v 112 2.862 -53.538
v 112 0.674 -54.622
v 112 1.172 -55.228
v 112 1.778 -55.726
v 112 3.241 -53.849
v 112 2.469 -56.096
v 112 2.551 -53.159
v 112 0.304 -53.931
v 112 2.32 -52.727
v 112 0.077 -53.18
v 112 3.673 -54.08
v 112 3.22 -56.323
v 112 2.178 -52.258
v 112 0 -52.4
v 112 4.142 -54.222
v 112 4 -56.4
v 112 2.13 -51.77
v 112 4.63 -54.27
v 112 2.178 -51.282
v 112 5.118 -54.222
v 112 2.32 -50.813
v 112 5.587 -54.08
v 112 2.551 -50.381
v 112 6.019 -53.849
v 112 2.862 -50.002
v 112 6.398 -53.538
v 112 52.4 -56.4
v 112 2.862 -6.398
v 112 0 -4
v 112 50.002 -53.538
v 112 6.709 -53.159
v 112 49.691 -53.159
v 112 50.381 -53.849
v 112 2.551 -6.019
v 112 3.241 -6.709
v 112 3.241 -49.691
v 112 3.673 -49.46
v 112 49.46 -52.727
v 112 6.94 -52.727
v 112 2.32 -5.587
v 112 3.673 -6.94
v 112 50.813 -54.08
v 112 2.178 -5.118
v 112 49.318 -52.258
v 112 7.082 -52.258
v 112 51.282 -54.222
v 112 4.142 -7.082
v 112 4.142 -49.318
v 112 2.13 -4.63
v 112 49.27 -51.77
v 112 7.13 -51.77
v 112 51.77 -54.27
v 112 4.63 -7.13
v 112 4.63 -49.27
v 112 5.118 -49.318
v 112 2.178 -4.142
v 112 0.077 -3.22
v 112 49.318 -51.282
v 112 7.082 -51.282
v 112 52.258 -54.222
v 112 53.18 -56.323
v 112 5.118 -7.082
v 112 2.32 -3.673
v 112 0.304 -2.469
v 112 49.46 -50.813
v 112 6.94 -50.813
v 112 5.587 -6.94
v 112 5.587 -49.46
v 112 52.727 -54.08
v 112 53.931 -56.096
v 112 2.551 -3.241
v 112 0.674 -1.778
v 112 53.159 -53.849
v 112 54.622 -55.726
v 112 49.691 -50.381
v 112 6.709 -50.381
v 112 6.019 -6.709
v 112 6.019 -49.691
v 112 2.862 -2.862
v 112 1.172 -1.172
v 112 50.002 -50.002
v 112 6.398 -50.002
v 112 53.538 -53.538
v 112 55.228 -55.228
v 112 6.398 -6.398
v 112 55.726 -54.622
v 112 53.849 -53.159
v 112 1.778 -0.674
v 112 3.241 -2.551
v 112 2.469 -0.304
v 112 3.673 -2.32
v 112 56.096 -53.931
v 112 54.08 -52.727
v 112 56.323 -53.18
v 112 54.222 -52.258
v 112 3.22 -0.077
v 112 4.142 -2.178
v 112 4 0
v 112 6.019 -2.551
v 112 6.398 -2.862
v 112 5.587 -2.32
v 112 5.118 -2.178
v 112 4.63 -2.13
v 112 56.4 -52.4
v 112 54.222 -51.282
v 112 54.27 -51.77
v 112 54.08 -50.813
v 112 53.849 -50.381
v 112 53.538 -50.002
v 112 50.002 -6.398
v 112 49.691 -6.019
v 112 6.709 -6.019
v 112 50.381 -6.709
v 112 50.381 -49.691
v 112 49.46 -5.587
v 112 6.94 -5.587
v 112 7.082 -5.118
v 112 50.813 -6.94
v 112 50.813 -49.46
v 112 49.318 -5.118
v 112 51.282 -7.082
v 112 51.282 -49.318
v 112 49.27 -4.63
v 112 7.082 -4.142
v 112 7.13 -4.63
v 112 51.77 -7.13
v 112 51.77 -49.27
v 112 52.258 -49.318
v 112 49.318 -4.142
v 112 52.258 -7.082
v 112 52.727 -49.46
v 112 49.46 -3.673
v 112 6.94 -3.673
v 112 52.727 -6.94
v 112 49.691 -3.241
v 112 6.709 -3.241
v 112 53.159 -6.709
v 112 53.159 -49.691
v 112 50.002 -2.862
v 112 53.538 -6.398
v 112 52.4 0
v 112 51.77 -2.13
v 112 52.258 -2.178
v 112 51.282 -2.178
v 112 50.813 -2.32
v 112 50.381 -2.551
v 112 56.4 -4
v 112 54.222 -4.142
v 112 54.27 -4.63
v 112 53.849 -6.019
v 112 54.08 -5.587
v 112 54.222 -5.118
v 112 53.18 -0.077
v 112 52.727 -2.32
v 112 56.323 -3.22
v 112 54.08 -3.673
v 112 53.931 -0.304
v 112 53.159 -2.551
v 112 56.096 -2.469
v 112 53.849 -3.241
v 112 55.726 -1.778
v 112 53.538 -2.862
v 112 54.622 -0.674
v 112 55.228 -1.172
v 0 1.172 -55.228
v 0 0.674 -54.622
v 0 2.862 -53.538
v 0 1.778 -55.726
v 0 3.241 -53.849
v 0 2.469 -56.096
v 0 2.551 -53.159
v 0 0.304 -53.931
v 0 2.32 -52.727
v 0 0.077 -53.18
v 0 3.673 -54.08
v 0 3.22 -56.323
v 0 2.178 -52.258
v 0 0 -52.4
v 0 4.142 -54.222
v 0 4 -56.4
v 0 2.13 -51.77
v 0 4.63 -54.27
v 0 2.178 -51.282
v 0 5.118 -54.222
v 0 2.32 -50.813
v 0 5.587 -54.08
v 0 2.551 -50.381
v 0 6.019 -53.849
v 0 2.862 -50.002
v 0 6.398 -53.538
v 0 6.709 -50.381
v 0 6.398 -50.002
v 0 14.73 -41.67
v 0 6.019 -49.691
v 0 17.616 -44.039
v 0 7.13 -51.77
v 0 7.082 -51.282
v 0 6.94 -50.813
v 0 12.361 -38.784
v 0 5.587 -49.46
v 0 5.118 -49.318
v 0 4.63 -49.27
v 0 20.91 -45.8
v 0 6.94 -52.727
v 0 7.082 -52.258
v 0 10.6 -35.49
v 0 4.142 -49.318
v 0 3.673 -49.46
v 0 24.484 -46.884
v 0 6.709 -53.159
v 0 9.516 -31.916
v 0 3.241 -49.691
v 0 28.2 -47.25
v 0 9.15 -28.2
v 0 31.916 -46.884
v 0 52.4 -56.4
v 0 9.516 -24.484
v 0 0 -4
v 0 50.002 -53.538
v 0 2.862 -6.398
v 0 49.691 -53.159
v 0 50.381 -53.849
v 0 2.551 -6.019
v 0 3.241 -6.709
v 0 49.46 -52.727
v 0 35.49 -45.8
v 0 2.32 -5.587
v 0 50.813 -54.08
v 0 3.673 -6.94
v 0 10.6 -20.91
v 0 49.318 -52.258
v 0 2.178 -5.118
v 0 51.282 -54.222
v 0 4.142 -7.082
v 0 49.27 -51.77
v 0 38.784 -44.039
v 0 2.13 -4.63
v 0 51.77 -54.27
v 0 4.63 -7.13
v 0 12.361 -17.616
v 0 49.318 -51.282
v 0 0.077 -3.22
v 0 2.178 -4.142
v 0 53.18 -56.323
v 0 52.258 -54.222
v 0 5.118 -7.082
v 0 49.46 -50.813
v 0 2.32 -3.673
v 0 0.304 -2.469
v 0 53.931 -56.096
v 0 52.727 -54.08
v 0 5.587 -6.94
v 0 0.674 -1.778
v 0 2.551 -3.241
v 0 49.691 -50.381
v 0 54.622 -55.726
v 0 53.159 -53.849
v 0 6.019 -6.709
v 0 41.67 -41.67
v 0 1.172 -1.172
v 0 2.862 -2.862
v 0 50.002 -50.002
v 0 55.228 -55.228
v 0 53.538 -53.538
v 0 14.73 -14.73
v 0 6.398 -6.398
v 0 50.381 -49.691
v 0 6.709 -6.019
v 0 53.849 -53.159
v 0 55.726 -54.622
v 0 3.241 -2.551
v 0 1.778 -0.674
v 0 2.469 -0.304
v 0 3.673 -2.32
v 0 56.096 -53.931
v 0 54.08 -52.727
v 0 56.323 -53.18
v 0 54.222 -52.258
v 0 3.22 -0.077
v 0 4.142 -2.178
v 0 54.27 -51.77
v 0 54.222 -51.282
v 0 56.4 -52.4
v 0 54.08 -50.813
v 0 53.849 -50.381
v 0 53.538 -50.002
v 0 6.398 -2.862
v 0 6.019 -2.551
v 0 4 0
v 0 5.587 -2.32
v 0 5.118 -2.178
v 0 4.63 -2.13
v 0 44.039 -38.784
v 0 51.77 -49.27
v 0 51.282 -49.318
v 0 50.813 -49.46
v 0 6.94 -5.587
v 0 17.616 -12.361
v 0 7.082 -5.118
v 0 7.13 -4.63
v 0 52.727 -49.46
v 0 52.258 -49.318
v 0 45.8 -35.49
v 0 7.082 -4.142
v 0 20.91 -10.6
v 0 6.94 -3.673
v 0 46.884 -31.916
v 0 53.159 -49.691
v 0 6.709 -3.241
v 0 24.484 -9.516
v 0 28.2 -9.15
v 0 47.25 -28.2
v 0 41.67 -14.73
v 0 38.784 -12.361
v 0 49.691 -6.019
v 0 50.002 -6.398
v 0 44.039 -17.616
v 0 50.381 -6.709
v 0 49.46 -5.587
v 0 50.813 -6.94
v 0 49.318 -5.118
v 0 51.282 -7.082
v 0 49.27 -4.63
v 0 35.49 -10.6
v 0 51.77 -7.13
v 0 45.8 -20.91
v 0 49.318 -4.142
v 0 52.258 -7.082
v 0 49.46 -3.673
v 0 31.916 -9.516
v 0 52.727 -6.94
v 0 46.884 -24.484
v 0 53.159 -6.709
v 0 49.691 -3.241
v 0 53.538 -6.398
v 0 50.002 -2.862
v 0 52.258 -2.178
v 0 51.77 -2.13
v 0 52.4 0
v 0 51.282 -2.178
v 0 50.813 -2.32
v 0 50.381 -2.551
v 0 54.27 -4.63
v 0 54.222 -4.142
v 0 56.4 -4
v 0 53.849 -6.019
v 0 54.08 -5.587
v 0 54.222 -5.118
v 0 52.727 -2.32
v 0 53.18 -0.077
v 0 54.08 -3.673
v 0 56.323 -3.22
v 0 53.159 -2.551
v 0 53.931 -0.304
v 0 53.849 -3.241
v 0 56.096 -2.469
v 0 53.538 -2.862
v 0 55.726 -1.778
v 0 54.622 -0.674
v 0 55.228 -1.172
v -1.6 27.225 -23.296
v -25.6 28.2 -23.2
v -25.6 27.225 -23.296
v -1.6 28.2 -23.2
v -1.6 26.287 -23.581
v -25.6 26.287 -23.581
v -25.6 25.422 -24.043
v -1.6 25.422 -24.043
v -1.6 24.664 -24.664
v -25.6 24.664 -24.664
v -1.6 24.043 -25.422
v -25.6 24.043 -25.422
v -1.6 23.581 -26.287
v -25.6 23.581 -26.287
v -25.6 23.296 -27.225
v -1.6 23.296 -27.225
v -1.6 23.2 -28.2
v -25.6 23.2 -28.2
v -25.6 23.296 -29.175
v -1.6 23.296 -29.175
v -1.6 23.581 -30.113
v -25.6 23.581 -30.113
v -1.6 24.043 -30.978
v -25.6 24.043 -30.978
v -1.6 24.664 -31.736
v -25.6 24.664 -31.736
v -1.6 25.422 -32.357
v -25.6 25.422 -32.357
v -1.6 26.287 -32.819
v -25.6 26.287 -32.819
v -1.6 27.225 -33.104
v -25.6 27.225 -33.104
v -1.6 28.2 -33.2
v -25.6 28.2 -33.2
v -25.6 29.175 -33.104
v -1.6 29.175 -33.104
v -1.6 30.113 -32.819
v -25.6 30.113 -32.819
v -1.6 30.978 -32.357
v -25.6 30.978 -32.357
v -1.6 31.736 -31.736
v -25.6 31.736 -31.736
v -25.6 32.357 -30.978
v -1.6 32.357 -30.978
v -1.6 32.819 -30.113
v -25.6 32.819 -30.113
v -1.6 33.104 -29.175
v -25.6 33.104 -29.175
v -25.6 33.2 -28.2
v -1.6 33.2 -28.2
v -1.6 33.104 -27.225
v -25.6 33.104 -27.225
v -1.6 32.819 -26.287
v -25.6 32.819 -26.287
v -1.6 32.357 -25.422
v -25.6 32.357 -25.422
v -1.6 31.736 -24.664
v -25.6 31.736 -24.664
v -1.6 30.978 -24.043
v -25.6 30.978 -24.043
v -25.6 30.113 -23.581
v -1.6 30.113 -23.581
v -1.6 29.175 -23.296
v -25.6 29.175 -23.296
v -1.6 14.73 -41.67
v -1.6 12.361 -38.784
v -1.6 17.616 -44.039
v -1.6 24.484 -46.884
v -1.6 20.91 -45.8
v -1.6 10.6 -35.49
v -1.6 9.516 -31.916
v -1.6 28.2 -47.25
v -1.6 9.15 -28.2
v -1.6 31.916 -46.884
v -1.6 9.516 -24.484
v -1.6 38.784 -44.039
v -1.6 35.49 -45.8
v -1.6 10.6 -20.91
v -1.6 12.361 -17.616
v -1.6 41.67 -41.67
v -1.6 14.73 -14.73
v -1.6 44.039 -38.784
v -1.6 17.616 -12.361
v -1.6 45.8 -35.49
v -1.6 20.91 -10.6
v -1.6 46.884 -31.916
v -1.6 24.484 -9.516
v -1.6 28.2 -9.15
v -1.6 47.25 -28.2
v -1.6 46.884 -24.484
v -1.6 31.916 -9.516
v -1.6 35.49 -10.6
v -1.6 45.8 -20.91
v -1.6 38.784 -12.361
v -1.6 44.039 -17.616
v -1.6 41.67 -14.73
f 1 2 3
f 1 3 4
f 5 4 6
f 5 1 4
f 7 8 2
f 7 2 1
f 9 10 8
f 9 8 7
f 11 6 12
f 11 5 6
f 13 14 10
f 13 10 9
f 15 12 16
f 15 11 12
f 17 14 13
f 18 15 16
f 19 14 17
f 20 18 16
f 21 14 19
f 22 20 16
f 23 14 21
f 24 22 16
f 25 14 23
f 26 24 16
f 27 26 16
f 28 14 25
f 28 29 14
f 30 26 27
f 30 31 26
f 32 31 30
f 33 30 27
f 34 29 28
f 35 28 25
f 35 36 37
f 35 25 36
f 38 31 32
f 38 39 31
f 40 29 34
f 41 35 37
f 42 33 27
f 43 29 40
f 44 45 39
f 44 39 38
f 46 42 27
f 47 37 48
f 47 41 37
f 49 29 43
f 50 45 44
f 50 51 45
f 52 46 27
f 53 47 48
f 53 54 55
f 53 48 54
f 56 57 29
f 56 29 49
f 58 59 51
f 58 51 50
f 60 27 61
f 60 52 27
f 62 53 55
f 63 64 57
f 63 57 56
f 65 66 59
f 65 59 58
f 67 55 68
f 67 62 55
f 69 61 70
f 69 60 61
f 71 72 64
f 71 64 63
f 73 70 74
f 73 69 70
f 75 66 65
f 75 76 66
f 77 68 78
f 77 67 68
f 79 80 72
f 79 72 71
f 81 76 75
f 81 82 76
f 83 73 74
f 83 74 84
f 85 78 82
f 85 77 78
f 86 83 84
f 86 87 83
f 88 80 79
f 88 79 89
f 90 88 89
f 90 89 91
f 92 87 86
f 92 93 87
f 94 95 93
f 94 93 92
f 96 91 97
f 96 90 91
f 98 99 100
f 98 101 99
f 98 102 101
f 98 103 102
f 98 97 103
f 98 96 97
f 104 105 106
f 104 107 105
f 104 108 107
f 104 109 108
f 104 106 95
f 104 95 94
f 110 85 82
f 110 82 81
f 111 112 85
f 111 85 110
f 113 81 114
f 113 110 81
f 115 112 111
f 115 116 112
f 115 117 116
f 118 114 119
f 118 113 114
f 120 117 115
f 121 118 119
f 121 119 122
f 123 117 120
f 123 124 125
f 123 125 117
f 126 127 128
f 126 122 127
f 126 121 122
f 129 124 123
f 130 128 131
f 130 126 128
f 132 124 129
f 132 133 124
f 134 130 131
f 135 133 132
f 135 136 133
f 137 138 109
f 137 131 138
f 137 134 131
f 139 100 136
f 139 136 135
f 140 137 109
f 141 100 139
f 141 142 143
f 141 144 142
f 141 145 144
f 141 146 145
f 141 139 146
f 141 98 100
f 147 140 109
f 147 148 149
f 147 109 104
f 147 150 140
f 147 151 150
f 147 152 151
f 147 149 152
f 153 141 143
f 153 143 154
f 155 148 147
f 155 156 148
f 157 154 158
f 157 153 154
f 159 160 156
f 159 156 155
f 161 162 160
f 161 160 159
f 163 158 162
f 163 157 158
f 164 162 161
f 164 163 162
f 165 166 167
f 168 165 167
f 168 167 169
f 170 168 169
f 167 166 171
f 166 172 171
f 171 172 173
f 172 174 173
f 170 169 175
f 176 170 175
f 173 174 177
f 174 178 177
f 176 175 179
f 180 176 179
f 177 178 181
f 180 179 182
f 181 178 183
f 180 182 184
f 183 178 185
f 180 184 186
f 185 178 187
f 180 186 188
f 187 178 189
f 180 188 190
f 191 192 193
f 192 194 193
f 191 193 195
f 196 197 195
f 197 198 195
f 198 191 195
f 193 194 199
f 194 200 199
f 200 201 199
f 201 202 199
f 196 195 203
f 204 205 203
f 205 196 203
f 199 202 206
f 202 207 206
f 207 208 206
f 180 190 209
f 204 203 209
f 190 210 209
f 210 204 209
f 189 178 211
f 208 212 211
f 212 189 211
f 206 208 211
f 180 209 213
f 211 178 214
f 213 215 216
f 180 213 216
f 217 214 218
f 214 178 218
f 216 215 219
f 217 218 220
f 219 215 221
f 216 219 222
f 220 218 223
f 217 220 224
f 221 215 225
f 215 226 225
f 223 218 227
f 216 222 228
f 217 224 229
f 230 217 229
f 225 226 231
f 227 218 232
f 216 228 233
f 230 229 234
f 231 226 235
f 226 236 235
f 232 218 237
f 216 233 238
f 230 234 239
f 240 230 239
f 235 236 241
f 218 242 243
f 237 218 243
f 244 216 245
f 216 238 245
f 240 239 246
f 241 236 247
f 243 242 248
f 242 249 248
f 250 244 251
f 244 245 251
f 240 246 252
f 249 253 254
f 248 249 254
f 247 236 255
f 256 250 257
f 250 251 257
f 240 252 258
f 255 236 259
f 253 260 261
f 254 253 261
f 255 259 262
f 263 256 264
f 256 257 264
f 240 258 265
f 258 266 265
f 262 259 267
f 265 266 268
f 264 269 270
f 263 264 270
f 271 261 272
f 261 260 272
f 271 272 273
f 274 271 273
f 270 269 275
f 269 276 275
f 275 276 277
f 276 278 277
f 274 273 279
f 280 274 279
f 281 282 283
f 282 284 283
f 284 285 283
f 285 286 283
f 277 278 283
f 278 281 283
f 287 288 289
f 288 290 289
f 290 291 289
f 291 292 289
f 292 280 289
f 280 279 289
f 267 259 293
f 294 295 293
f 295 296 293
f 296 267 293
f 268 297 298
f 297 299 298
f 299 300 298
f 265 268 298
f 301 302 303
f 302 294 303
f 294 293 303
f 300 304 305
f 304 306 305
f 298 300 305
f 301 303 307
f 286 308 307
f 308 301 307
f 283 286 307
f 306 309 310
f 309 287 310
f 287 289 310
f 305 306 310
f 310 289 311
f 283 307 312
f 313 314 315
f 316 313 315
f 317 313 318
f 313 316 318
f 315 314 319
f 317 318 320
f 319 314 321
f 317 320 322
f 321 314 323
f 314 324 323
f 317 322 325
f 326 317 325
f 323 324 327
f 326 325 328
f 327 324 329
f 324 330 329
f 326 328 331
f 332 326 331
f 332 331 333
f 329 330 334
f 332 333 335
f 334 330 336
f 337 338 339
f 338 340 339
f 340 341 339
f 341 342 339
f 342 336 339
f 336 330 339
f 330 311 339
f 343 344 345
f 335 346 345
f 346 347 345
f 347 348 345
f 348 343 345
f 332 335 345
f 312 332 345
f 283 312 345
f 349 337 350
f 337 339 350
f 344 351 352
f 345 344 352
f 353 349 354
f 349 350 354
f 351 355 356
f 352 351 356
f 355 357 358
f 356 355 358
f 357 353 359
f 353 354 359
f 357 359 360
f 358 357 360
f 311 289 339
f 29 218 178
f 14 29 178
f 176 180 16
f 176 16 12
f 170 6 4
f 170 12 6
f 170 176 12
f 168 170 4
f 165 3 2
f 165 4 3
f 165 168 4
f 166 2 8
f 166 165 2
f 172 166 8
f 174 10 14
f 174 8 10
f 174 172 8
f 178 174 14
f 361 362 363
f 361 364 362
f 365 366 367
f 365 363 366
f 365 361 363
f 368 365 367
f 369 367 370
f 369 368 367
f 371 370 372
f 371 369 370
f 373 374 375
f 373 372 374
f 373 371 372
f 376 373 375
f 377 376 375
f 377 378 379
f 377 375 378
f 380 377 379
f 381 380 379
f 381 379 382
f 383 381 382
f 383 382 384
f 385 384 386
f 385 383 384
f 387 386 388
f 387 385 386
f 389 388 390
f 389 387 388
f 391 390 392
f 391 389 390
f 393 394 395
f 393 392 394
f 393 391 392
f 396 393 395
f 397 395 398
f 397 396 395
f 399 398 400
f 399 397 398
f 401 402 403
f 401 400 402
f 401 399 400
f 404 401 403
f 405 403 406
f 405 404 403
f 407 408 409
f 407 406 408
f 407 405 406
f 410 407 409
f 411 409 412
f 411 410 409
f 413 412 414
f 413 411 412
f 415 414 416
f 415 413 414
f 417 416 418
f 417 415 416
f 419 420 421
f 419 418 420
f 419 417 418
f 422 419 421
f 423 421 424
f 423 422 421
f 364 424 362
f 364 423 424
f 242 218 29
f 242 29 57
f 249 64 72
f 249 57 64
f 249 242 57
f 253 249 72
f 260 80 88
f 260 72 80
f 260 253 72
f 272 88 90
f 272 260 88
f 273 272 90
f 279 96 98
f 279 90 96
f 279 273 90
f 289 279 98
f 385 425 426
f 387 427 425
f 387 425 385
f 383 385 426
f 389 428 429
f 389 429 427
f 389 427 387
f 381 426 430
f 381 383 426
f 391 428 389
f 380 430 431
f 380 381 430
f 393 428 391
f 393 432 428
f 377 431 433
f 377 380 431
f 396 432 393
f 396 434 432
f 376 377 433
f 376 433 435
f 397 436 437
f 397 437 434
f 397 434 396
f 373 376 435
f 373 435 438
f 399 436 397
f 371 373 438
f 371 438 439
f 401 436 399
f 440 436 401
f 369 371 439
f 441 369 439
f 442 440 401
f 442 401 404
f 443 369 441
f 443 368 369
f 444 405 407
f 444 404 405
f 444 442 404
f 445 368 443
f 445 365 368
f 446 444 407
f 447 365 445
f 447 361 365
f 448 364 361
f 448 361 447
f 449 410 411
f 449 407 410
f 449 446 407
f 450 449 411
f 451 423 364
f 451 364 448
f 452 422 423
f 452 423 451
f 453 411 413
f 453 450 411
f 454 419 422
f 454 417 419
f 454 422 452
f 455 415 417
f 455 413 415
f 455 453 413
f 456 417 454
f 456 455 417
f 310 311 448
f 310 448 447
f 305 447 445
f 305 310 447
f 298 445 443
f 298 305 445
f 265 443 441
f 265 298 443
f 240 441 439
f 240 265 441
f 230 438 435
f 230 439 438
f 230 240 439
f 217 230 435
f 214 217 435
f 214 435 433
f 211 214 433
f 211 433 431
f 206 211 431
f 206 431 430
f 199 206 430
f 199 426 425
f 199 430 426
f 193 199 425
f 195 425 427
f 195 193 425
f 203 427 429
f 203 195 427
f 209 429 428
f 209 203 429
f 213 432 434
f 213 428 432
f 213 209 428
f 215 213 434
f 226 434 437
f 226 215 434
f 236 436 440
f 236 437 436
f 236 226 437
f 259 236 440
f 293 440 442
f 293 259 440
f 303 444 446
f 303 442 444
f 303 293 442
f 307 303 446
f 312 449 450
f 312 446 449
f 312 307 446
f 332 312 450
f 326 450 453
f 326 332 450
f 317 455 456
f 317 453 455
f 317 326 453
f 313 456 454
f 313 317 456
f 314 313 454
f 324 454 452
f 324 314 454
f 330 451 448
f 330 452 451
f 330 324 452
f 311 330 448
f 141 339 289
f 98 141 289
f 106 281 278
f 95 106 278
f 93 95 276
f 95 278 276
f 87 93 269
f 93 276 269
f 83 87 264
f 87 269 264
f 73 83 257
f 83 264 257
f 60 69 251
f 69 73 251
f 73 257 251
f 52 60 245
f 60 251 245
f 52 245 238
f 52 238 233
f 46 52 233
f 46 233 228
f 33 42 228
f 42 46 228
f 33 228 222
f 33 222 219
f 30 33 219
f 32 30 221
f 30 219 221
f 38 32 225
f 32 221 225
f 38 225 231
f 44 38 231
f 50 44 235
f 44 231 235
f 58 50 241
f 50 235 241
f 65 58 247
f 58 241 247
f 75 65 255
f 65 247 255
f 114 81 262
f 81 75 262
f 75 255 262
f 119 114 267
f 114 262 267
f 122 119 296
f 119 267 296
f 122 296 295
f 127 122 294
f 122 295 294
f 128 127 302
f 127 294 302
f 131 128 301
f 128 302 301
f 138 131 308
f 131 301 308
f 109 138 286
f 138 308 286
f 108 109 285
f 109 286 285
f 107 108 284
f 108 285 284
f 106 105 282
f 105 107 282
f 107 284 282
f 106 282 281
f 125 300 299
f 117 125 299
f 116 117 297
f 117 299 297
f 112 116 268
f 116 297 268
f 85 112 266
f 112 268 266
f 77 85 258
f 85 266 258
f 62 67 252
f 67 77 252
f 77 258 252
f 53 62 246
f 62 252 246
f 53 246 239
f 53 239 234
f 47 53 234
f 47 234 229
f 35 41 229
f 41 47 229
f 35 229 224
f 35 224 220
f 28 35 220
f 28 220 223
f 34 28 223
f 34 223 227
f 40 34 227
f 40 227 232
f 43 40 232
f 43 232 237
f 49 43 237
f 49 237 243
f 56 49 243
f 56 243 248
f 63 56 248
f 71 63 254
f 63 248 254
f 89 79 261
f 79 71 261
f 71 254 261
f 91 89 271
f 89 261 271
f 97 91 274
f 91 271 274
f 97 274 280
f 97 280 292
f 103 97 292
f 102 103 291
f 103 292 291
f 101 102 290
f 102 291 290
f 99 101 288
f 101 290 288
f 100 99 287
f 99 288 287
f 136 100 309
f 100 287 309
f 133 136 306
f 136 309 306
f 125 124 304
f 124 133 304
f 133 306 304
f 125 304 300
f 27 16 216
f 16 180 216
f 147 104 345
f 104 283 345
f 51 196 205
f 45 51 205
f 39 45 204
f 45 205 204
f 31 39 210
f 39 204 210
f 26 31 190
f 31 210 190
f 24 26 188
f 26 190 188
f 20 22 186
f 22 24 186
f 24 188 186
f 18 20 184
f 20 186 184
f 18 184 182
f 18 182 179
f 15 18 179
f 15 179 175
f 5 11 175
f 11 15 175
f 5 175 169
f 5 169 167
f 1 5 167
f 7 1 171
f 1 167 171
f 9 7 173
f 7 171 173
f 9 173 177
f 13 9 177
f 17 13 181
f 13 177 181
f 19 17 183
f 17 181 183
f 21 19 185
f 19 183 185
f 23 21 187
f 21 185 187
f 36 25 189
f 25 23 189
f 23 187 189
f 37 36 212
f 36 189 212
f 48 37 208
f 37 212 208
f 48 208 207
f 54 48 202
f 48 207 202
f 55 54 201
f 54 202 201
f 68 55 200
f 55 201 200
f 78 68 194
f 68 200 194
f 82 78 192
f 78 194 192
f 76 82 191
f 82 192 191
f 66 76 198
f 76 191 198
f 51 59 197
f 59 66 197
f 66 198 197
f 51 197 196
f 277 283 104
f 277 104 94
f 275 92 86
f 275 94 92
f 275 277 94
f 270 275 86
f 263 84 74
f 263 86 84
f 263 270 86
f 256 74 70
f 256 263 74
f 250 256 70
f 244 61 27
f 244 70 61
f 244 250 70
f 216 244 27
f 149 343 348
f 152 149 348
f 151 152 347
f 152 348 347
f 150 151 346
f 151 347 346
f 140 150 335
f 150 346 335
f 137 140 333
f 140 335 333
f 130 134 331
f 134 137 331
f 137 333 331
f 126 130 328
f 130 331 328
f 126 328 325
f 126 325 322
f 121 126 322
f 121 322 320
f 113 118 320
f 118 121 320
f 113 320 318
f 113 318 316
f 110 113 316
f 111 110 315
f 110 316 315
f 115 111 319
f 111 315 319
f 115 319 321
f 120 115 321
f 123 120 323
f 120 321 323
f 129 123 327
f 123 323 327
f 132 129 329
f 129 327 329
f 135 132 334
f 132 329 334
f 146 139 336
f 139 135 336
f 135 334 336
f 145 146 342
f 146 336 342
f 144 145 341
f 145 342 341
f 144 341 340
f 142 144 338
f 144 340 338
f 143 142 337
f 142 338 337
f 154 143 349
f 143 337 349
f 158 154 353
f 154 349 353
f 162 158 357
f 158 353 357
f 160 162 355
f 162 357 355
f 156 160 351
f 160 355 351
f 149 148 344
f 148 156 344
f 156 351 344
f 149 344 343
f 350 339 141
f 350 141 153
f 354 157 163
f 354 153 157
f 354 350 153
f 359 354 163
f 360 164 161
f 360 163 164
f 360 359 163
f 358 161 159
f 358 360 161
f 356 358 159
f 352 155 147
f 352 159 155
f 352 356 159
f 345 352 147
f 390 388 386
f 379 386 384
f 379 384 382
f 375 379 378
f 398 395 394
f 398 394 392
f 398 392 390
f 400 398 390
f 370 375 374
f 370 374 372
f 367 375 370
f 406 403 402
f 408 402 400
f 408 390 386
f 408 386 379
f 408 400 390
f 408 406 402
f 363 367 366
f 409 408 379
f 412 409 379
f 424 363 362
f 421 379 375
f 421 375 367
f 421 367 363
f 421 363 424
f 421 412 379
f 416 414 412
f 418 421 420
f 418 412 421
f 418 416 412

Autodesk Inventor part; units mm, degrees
ref_plane "YZ Plane" through (0, 0, 0) normal (1, 0, 0) x (0, 1, 0)
ref_plane "XZ Plane" through (0, 0, 0) normal (0, 1, 0) x (-1, 0, 0)
ref_plane "XY Plane" through (0, 0, 0) normal (0, 0, 1) x (1, 0, 0)
sketch "Sketch1" plane through (0, 0, 0) normal (1, 0, 0) x (0, 1, 0)
  line L0 (52.4, 0) -> (4, 0)
  line L1 (0, -4) -> (0, -52.4)
  line L2 (4, -56.4) -> (52.4, -56.4)
  line L3 (56.4, -52.4) -> (56.4, -4)
  line L4 (51.77, -4.63) -> (4.63, -4.63) construction
  line L5 (4.63, -4.63) -> (4.63, -51.77) construction
  line L6 (4.63, -51.77) -> (51.77, -51.77) construction
  line L7 (51.77, -51.77) -> (51.77, -4.63) construction
  circle A0 centre (51.77, -4.63) radius 2.5
  circle A1 centre (51.77, -51.77) radius 2.5
  circle A2 centre (4.63, -4.63) radius 2.5
  circle A3 centre (4.63, -51.77) radius 2.5
  arc A4 (56.4, -4) -> (52.4, 0) centre (52.4, -4) ccw
  arc A5 (52.4, -56.4) -> (56.4, -52.4) centre (52.4, -52.4) ccw
  arc A6 (0, -52.4) -> (4, -56.4) centre (4, -52.4) ccw
  arc A7 (4, 0) -> (0, -4) centre (4, -4) ccw
  point P0 (0, 0)
  point P1 (56.4, 0)
  point P2 (0, 0)
  point P3 (56.4, -56.4)
  point P4 (56.4, -28.2)
  point P5 (51.77, -28.2)
  point P6 (28.2, -51.77)
  point P7 (28.2, -56.4)
  dimension "d0" = 56.4
  dimension "d1" = 47.14
  dimension "d2" = 5
  dimension "d3" = 4
  dimension "d4" = 4
  dimension "d5" = 4
  dimension "d6" = 4
extrude "Extrusion1" add sketch "Sketch1" along normal blind 112
sketch "Sketch2" plane through (0, 0, 0) normal (-1, 0, 0) x (0, 0, 1)
  circle A0 centre (-28.2, 28.2) radius 19.05
  line L0 (-52.4, 56.4) -> (-4, 56.4) projected
  line L1 (-56.4, 4) -> (-56.4, 52.4) projected
  point P0 (0, 0)
  point P1 (-28.2, 56.4)
  point P2 (-56.4, 28.2)
  dimension "d9" = 38.1
extrude "Extrusion2" add sketch "Sketch2" along normal blind 1.6
sketch "Sketch3" plane through (-1.6, 28.2, -28.2) normal (-1, 0, 0) x (0, 0, 1)
  circle A0 centre (0, 0) radius 5
  circle A1 centre (0, 0) radius 19.05 construction
  point P0 (28.2, -28.2)
  dimension "d12" = 10
extrude "Extrusion3" add sketch "Sketch3" along normal blind 24
properties part number "Nema23"
